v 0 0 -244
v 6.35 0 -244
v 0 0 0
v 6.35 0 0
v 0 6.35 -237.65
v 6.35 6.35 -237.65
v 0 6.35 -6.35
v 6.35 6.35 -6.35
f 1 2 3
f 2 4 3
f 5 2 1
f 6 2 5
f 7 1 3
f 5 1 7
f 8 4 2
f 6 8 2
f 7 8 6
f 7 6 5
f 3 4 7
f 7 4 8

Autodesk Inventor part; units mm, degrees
ref_plane "YZ Plane" through (0, 0, 0) normal (1, 0, 0) x (0, 1, 0)
ref_plane "XZ Plane" through (0, 0, 0) normal (0, 1, 0) x (-1, 0, 0)
ref_plane "XY Plane" through (0, 0, 0) normal (0, 0, 1) x (1, 0, 0)
sketch "Sketch1" plane through (0, 0, 0) normal (0, 1, 0) x (-1, 0, 0)
  line L0 (0, 0) -> (-6.35, 0)
  line L1 (-6.35, 0) -> (-6.35, -244)
  line L2 (-6.35, -244) -> (0, -244)
  line L3 (0, -244) -> (0, 0)
  dimension "d0" = 6.35
  dimension "d1" = 244
extrude "Extrusion1" add sketch "Sketch1" along normal blind 6.35
sketch "Sketch2" plane through (6.35, 0, 0) normal (1, 0, 0) x (0, 0, -1)
  line L0 (0, 0) -> (244, 0) projected
  line L1 (0, 0) -> (6.35, 6.35)
  line L2 (0, 6.35) -> (244, 6.35) projected
  line L3 (0, 0) -> (8.9803, 0) construction
  line L4 (6.35, 6.35) -> (0, 6.35)
  line L5 (0, 6.35) -> (0, 0)
  dimension "d4" = 45
extrude "Extrusion2" cut sketch "Sketch2" against normal blind 10
sketch "Sketch3" plane through (6.35, 0, -244) normal (1, 0, 0) x (0, 0, -1)
  line L0 (0, 0) -> (-6.35, 6.35)
  line L1 (0, 6.35) -> (-237.65, 6.35) projected
  line L2 (0, 0) -> (8.9803, 0) construction
  line L3 (-6.35, 6.35) -> (0, 6.35)
  line L4 (0, 6.35) -> (0, 0)
  point P0 (-244, 0)
  dimension "d7" = 135
extrude "Extrusion3" cut sketch "Sketch3" against normal blind 10
properties part number "6"
